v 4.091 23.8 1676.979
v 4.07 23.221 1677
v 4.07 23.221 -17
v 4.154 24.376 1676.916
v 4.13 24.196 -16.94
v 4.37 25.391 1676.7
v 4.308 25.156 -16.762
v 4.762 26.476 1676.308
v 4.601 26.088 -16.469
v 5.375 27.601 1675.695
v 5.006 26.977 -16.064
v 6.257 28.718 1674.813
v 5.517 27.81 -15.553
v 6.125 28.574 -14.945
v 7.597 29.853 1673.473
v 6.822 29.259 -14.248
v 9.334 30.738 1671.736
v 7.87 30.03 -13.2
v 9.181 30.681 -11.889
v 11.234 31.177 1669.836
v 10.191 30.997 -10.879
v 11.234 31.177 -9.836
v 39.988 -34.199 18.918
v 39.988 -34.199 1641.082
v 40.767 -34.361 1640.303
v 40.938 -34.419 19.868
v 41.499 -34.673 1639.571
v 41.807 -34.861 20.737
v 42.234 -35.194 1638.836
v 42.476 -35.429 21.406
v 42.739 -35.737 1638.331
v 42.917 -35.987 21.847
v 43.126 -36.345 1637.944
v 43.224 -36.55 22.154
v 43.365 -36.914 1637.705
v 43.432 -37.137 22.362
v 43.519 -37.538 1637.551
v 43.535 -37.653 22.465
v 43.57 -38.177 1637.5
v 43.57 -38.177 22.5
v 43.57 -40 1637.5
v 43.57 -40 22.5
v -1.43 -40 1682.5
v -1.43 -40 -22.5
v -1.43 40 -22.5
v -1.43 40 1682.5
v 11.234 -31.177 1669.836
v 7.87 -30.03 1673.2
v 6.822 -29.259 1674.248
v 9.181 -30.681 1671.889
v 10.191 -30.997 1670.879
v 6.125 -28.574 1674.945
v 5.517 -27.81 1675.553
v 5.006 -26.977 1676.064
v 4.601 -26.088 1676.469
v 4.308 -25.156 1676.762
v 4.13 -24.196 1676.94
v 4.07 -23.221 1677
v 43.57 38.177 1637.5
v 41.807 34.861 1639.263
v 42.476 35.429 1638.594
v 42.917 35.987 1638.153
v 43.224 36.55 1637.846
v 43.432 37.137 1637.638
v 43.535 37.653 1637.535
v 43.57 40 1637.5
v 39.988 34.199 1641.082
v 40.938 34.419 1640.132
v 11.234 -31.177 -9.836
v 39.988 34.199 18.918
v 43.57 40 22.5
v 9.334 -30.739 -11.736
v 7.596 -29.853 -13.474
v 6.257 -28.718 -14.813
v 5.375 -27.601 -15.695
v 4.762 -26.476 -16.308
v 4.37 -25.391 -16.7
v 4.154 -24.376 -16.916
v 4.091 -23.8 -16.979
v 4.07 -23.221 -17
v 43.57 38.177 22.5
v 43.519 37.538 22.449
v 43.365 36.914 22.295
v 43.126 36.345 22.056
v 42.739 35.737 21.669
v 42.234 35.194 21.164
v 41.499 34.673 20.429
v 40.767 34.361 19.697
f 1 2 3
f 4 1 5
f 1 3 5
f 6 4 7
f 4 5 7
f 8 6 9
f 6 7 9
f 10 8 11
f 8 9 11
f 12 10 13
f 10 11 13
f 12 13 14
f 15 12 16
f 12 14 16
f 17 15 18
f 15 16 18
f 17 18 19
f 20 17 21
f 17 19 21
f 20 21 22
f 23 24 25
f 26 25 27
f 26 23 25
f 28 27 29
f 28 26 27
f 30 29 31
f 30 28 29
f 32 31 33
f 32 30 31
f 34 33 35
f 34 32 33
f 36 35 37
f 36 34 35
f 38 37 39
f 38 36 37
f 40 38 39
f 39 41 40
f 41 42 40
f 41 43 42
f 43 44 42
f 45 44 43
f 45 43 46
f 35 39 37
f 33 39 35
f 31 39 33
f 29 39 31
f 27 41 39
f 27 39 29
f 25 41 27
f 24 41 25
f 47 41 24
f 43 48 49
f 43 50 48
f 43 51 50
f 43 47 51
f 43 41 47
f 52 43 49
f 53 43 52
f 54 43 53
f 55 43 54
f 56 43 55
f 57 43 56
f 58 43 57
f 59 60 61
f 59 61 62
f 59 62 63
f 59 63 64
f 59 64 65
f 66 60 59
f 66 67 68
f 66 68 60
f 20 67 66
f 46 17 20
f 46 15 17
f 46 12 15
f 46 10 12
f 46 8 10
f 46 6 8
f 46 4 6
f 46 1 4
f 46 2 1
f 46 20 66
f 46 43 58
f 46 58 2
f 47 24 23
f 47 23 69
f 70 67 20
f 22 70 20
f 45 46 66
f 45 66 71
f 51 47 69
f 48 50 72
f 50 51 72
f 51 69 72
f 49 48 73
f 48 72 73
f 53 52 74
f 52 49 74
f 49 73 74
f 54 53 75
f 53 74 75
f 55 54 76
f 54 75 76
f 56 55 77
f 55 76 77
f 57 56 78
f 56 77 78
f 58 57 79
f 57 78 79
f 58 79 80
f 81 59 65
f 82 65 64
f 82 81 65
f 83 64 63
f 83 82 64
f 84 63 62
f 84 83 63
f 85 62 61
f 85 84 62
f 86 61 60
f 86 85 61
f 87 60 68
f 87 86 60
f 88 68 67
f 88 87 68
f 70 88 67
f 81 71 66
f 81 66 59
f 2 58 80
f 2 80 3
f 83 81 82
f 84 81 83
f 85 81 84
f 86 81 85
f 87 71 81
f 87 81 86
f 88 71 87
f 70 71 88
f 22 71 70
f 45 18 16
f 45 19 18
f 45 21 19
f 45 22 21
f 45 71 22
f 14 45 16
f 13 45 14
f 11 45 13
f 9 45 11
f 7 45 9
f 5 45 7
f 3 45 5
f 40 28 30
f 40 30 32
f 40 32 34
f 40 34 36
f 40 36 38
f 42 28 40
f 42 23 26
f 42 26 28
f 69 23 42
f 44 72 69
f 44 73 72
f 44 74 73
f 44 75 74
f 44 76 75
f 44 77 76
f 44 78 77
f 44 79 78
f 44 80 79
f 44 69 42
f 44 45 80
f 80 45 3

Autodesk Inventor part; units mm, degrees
ref_plane "Начальная плоскость" through (0, 0, -22.5) normal (0, 0, 1) x (1, 0, 0)
ref_plane "Конечная плоскость" through (0, 0, 1682.5) normal (0, 0, 1) x (1, 0, 0)
sketch "Эскиз" plane through (0, 0, 0) normal (0, 0, 1) x (1, 0, 0)
  line L0 (-1.43, 0) -> (-1.43, 40)
  line L1 (-1.43, 40) -> (43.57, 40)
  line L2 (43.57, 40) -> (43.57, 38.1774)
  line L3 (39.9881, 34.1993) -> (11.2338, 31.1771)
  line L4 (4.07, 23.221) -> (4.07, 0)
  line L5 (4.07, 0) -> (-1.43, 0) construction
  line L6 (23.82, 40) -> (23.82, 32.5) construction
  line L7 (43.57, 34.5758) -> (43.57, 32.5) construction
  line L8 (43.57, 32.5) -> (23.82, 32.5) construction
  line L9 (0, 15) -> (0, -27) construction
  line L10 (-5.539, 0) -> (16.0067, 0) construction
  line L11 (-1.43, 0) -> (-1.43, -40)
  line L12 (-1.43, -40) -> (43.57, -40)
  line L13 (43.57, -40) -> (43.57, -38.1774)
  line L14 (39.9881, -34.1993) -> (11.2338, -31.1771)
  line L15 (4.07, -23.221) -> (4.07, 0)
  arc A0 (11.2338, 31.1771) -> (4.07, 23.221) centre (12.07, 23.221) ccw
  arc A1 (4.07, -23.221) -> (11.2338, -31.1771) centre (12.07, -23.221) ccw
  arc A2 (39.9881, 34.1993) -> (43.57, 38.1774) centre (39.57, 38.1774) ccw
  arc A3 (43.57, -38.1774) -> (39.9881, -34.1993) centre (39.57, -38.1774) ccw
  line L16 (0, 56) -> (0, -56) construction
  line L17 (-15.5135, 0) -> (54.308, 0) construction
  point P0 (4.07, 30.4242)
  point P1 (43.57, -34.5758)
  point P2 (4.07, -30.4242)
  point P3 (23.82, -40)
  point P4 (23.82, -32.5)
  dimension "d0" = 5.5
  dimension "d1" = 40
  dimension "d2" = 45
  dimension "d3" = 7.5
  dimension "d4" = 19.75
  dimension "d5" = 2.0758
  dimension "d23" = 8
  dimension "d24" = 4
  dimension "d25" = 1.43
extrude "Тело" add sketch "Эскиз" along normal up to surface (1705 mm away) from surface at -22.5
sketch "Sketch3" plane through (0, 0, 0) normal (0, 0, 1) x (1, 0, 0)
  line L0 (0, 0) -> (10, 0)
ref_plane "Work Plane3" through (0, 0, 0) normal (0, -1, 0) x (1, 0, 0)
sketch "Sketch4" plane through (0, 0, 0) normal (0, -1, 0) x (1, 0, 0)
  line L0 (-2, -22.5) -> (12, -22.5)
  line L1 (-2, 1682.5) -> (12, 1682.5)
  dimension "d29" = 1705
ref_plane "РабПлоскость4" through (-1.43, 0, -22.5) normal (0.7071, 0, -0.7071) x (-0.7071, 0, -0.7071)
split "Разделение1" plane through (-1.43, 0, -22.5) removes the side toward (0.7071, 0, -0.7071)
ref_plane "РабПлоскость5" through (-1.43, 0, 1682.5) normal (0.7071, 0, 0.7071) x (0.7071, 0, -0.7071)
split "Разделение2" plane through (-1.43, 0, 1682.5) removes the side toward (0.7071, 0, 0.7071)
equation "\"d0\" = G_T"
equation "\"d1\" = 0.5 * G_H"
equation "\"d2\" = G_W"
equation "\"d3\" = G_T1"
equation "\"d4\" = G_C"
equation "\"d23\" = G_IR"
equation "\"d24\" = G_ER"
equation "\"d25\" = ex"
equation "\"d6\" = G_L"
equation "\"G_W\" = 45"
equation "\"G_T\" = 5.5"
equation "\"G_T1\" = 7.5"
equation "\"G_NG\" = 0.105104"
equation "\"G_ER\" = 4"
equation "\"G_IR\" = 8"
equation "\"G_C\" = 19.75"
equation "\"G_L\" = d29"
equation "\"ex\" = 1.43"
equation "\"G_OFFSET_START\" = 22.5"
equation "\"G_OFFSET_END\" = 22.5"
equation "\"d26\" = -G_OFFSET_START"
equation "\"d27\" = G_OFFSET_END + B_L"
equation "\"G_H\" = 80"
equation "\"B_L\" = 1660"
properties part number "ISO 657/11 - CH 80 x 8 - 1705" material "Сталь, мягкая"
